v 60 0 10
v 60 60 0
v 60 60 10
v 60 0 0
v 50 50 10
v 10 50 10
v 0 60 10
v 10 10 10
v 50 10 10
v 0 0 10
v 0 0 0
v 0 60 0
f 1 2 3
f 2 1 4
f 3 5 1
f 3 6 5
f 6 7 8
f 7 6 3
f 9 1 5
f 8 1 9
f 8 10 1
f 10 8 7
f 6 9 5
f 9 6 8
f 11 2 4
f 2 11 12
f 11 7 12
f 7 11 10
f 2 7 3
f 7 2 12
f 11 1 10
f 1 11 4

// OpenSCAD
difference() {
    // Base plate
    cube([60, 60, 10]);

    // Middle plate
    translate([10, 10, 10]) {
        cube([40, 40, 10]);
    }

    // Top plate
    translate([20, 20, 20]) {
        cube([20, 20, 10]);
    }
}
